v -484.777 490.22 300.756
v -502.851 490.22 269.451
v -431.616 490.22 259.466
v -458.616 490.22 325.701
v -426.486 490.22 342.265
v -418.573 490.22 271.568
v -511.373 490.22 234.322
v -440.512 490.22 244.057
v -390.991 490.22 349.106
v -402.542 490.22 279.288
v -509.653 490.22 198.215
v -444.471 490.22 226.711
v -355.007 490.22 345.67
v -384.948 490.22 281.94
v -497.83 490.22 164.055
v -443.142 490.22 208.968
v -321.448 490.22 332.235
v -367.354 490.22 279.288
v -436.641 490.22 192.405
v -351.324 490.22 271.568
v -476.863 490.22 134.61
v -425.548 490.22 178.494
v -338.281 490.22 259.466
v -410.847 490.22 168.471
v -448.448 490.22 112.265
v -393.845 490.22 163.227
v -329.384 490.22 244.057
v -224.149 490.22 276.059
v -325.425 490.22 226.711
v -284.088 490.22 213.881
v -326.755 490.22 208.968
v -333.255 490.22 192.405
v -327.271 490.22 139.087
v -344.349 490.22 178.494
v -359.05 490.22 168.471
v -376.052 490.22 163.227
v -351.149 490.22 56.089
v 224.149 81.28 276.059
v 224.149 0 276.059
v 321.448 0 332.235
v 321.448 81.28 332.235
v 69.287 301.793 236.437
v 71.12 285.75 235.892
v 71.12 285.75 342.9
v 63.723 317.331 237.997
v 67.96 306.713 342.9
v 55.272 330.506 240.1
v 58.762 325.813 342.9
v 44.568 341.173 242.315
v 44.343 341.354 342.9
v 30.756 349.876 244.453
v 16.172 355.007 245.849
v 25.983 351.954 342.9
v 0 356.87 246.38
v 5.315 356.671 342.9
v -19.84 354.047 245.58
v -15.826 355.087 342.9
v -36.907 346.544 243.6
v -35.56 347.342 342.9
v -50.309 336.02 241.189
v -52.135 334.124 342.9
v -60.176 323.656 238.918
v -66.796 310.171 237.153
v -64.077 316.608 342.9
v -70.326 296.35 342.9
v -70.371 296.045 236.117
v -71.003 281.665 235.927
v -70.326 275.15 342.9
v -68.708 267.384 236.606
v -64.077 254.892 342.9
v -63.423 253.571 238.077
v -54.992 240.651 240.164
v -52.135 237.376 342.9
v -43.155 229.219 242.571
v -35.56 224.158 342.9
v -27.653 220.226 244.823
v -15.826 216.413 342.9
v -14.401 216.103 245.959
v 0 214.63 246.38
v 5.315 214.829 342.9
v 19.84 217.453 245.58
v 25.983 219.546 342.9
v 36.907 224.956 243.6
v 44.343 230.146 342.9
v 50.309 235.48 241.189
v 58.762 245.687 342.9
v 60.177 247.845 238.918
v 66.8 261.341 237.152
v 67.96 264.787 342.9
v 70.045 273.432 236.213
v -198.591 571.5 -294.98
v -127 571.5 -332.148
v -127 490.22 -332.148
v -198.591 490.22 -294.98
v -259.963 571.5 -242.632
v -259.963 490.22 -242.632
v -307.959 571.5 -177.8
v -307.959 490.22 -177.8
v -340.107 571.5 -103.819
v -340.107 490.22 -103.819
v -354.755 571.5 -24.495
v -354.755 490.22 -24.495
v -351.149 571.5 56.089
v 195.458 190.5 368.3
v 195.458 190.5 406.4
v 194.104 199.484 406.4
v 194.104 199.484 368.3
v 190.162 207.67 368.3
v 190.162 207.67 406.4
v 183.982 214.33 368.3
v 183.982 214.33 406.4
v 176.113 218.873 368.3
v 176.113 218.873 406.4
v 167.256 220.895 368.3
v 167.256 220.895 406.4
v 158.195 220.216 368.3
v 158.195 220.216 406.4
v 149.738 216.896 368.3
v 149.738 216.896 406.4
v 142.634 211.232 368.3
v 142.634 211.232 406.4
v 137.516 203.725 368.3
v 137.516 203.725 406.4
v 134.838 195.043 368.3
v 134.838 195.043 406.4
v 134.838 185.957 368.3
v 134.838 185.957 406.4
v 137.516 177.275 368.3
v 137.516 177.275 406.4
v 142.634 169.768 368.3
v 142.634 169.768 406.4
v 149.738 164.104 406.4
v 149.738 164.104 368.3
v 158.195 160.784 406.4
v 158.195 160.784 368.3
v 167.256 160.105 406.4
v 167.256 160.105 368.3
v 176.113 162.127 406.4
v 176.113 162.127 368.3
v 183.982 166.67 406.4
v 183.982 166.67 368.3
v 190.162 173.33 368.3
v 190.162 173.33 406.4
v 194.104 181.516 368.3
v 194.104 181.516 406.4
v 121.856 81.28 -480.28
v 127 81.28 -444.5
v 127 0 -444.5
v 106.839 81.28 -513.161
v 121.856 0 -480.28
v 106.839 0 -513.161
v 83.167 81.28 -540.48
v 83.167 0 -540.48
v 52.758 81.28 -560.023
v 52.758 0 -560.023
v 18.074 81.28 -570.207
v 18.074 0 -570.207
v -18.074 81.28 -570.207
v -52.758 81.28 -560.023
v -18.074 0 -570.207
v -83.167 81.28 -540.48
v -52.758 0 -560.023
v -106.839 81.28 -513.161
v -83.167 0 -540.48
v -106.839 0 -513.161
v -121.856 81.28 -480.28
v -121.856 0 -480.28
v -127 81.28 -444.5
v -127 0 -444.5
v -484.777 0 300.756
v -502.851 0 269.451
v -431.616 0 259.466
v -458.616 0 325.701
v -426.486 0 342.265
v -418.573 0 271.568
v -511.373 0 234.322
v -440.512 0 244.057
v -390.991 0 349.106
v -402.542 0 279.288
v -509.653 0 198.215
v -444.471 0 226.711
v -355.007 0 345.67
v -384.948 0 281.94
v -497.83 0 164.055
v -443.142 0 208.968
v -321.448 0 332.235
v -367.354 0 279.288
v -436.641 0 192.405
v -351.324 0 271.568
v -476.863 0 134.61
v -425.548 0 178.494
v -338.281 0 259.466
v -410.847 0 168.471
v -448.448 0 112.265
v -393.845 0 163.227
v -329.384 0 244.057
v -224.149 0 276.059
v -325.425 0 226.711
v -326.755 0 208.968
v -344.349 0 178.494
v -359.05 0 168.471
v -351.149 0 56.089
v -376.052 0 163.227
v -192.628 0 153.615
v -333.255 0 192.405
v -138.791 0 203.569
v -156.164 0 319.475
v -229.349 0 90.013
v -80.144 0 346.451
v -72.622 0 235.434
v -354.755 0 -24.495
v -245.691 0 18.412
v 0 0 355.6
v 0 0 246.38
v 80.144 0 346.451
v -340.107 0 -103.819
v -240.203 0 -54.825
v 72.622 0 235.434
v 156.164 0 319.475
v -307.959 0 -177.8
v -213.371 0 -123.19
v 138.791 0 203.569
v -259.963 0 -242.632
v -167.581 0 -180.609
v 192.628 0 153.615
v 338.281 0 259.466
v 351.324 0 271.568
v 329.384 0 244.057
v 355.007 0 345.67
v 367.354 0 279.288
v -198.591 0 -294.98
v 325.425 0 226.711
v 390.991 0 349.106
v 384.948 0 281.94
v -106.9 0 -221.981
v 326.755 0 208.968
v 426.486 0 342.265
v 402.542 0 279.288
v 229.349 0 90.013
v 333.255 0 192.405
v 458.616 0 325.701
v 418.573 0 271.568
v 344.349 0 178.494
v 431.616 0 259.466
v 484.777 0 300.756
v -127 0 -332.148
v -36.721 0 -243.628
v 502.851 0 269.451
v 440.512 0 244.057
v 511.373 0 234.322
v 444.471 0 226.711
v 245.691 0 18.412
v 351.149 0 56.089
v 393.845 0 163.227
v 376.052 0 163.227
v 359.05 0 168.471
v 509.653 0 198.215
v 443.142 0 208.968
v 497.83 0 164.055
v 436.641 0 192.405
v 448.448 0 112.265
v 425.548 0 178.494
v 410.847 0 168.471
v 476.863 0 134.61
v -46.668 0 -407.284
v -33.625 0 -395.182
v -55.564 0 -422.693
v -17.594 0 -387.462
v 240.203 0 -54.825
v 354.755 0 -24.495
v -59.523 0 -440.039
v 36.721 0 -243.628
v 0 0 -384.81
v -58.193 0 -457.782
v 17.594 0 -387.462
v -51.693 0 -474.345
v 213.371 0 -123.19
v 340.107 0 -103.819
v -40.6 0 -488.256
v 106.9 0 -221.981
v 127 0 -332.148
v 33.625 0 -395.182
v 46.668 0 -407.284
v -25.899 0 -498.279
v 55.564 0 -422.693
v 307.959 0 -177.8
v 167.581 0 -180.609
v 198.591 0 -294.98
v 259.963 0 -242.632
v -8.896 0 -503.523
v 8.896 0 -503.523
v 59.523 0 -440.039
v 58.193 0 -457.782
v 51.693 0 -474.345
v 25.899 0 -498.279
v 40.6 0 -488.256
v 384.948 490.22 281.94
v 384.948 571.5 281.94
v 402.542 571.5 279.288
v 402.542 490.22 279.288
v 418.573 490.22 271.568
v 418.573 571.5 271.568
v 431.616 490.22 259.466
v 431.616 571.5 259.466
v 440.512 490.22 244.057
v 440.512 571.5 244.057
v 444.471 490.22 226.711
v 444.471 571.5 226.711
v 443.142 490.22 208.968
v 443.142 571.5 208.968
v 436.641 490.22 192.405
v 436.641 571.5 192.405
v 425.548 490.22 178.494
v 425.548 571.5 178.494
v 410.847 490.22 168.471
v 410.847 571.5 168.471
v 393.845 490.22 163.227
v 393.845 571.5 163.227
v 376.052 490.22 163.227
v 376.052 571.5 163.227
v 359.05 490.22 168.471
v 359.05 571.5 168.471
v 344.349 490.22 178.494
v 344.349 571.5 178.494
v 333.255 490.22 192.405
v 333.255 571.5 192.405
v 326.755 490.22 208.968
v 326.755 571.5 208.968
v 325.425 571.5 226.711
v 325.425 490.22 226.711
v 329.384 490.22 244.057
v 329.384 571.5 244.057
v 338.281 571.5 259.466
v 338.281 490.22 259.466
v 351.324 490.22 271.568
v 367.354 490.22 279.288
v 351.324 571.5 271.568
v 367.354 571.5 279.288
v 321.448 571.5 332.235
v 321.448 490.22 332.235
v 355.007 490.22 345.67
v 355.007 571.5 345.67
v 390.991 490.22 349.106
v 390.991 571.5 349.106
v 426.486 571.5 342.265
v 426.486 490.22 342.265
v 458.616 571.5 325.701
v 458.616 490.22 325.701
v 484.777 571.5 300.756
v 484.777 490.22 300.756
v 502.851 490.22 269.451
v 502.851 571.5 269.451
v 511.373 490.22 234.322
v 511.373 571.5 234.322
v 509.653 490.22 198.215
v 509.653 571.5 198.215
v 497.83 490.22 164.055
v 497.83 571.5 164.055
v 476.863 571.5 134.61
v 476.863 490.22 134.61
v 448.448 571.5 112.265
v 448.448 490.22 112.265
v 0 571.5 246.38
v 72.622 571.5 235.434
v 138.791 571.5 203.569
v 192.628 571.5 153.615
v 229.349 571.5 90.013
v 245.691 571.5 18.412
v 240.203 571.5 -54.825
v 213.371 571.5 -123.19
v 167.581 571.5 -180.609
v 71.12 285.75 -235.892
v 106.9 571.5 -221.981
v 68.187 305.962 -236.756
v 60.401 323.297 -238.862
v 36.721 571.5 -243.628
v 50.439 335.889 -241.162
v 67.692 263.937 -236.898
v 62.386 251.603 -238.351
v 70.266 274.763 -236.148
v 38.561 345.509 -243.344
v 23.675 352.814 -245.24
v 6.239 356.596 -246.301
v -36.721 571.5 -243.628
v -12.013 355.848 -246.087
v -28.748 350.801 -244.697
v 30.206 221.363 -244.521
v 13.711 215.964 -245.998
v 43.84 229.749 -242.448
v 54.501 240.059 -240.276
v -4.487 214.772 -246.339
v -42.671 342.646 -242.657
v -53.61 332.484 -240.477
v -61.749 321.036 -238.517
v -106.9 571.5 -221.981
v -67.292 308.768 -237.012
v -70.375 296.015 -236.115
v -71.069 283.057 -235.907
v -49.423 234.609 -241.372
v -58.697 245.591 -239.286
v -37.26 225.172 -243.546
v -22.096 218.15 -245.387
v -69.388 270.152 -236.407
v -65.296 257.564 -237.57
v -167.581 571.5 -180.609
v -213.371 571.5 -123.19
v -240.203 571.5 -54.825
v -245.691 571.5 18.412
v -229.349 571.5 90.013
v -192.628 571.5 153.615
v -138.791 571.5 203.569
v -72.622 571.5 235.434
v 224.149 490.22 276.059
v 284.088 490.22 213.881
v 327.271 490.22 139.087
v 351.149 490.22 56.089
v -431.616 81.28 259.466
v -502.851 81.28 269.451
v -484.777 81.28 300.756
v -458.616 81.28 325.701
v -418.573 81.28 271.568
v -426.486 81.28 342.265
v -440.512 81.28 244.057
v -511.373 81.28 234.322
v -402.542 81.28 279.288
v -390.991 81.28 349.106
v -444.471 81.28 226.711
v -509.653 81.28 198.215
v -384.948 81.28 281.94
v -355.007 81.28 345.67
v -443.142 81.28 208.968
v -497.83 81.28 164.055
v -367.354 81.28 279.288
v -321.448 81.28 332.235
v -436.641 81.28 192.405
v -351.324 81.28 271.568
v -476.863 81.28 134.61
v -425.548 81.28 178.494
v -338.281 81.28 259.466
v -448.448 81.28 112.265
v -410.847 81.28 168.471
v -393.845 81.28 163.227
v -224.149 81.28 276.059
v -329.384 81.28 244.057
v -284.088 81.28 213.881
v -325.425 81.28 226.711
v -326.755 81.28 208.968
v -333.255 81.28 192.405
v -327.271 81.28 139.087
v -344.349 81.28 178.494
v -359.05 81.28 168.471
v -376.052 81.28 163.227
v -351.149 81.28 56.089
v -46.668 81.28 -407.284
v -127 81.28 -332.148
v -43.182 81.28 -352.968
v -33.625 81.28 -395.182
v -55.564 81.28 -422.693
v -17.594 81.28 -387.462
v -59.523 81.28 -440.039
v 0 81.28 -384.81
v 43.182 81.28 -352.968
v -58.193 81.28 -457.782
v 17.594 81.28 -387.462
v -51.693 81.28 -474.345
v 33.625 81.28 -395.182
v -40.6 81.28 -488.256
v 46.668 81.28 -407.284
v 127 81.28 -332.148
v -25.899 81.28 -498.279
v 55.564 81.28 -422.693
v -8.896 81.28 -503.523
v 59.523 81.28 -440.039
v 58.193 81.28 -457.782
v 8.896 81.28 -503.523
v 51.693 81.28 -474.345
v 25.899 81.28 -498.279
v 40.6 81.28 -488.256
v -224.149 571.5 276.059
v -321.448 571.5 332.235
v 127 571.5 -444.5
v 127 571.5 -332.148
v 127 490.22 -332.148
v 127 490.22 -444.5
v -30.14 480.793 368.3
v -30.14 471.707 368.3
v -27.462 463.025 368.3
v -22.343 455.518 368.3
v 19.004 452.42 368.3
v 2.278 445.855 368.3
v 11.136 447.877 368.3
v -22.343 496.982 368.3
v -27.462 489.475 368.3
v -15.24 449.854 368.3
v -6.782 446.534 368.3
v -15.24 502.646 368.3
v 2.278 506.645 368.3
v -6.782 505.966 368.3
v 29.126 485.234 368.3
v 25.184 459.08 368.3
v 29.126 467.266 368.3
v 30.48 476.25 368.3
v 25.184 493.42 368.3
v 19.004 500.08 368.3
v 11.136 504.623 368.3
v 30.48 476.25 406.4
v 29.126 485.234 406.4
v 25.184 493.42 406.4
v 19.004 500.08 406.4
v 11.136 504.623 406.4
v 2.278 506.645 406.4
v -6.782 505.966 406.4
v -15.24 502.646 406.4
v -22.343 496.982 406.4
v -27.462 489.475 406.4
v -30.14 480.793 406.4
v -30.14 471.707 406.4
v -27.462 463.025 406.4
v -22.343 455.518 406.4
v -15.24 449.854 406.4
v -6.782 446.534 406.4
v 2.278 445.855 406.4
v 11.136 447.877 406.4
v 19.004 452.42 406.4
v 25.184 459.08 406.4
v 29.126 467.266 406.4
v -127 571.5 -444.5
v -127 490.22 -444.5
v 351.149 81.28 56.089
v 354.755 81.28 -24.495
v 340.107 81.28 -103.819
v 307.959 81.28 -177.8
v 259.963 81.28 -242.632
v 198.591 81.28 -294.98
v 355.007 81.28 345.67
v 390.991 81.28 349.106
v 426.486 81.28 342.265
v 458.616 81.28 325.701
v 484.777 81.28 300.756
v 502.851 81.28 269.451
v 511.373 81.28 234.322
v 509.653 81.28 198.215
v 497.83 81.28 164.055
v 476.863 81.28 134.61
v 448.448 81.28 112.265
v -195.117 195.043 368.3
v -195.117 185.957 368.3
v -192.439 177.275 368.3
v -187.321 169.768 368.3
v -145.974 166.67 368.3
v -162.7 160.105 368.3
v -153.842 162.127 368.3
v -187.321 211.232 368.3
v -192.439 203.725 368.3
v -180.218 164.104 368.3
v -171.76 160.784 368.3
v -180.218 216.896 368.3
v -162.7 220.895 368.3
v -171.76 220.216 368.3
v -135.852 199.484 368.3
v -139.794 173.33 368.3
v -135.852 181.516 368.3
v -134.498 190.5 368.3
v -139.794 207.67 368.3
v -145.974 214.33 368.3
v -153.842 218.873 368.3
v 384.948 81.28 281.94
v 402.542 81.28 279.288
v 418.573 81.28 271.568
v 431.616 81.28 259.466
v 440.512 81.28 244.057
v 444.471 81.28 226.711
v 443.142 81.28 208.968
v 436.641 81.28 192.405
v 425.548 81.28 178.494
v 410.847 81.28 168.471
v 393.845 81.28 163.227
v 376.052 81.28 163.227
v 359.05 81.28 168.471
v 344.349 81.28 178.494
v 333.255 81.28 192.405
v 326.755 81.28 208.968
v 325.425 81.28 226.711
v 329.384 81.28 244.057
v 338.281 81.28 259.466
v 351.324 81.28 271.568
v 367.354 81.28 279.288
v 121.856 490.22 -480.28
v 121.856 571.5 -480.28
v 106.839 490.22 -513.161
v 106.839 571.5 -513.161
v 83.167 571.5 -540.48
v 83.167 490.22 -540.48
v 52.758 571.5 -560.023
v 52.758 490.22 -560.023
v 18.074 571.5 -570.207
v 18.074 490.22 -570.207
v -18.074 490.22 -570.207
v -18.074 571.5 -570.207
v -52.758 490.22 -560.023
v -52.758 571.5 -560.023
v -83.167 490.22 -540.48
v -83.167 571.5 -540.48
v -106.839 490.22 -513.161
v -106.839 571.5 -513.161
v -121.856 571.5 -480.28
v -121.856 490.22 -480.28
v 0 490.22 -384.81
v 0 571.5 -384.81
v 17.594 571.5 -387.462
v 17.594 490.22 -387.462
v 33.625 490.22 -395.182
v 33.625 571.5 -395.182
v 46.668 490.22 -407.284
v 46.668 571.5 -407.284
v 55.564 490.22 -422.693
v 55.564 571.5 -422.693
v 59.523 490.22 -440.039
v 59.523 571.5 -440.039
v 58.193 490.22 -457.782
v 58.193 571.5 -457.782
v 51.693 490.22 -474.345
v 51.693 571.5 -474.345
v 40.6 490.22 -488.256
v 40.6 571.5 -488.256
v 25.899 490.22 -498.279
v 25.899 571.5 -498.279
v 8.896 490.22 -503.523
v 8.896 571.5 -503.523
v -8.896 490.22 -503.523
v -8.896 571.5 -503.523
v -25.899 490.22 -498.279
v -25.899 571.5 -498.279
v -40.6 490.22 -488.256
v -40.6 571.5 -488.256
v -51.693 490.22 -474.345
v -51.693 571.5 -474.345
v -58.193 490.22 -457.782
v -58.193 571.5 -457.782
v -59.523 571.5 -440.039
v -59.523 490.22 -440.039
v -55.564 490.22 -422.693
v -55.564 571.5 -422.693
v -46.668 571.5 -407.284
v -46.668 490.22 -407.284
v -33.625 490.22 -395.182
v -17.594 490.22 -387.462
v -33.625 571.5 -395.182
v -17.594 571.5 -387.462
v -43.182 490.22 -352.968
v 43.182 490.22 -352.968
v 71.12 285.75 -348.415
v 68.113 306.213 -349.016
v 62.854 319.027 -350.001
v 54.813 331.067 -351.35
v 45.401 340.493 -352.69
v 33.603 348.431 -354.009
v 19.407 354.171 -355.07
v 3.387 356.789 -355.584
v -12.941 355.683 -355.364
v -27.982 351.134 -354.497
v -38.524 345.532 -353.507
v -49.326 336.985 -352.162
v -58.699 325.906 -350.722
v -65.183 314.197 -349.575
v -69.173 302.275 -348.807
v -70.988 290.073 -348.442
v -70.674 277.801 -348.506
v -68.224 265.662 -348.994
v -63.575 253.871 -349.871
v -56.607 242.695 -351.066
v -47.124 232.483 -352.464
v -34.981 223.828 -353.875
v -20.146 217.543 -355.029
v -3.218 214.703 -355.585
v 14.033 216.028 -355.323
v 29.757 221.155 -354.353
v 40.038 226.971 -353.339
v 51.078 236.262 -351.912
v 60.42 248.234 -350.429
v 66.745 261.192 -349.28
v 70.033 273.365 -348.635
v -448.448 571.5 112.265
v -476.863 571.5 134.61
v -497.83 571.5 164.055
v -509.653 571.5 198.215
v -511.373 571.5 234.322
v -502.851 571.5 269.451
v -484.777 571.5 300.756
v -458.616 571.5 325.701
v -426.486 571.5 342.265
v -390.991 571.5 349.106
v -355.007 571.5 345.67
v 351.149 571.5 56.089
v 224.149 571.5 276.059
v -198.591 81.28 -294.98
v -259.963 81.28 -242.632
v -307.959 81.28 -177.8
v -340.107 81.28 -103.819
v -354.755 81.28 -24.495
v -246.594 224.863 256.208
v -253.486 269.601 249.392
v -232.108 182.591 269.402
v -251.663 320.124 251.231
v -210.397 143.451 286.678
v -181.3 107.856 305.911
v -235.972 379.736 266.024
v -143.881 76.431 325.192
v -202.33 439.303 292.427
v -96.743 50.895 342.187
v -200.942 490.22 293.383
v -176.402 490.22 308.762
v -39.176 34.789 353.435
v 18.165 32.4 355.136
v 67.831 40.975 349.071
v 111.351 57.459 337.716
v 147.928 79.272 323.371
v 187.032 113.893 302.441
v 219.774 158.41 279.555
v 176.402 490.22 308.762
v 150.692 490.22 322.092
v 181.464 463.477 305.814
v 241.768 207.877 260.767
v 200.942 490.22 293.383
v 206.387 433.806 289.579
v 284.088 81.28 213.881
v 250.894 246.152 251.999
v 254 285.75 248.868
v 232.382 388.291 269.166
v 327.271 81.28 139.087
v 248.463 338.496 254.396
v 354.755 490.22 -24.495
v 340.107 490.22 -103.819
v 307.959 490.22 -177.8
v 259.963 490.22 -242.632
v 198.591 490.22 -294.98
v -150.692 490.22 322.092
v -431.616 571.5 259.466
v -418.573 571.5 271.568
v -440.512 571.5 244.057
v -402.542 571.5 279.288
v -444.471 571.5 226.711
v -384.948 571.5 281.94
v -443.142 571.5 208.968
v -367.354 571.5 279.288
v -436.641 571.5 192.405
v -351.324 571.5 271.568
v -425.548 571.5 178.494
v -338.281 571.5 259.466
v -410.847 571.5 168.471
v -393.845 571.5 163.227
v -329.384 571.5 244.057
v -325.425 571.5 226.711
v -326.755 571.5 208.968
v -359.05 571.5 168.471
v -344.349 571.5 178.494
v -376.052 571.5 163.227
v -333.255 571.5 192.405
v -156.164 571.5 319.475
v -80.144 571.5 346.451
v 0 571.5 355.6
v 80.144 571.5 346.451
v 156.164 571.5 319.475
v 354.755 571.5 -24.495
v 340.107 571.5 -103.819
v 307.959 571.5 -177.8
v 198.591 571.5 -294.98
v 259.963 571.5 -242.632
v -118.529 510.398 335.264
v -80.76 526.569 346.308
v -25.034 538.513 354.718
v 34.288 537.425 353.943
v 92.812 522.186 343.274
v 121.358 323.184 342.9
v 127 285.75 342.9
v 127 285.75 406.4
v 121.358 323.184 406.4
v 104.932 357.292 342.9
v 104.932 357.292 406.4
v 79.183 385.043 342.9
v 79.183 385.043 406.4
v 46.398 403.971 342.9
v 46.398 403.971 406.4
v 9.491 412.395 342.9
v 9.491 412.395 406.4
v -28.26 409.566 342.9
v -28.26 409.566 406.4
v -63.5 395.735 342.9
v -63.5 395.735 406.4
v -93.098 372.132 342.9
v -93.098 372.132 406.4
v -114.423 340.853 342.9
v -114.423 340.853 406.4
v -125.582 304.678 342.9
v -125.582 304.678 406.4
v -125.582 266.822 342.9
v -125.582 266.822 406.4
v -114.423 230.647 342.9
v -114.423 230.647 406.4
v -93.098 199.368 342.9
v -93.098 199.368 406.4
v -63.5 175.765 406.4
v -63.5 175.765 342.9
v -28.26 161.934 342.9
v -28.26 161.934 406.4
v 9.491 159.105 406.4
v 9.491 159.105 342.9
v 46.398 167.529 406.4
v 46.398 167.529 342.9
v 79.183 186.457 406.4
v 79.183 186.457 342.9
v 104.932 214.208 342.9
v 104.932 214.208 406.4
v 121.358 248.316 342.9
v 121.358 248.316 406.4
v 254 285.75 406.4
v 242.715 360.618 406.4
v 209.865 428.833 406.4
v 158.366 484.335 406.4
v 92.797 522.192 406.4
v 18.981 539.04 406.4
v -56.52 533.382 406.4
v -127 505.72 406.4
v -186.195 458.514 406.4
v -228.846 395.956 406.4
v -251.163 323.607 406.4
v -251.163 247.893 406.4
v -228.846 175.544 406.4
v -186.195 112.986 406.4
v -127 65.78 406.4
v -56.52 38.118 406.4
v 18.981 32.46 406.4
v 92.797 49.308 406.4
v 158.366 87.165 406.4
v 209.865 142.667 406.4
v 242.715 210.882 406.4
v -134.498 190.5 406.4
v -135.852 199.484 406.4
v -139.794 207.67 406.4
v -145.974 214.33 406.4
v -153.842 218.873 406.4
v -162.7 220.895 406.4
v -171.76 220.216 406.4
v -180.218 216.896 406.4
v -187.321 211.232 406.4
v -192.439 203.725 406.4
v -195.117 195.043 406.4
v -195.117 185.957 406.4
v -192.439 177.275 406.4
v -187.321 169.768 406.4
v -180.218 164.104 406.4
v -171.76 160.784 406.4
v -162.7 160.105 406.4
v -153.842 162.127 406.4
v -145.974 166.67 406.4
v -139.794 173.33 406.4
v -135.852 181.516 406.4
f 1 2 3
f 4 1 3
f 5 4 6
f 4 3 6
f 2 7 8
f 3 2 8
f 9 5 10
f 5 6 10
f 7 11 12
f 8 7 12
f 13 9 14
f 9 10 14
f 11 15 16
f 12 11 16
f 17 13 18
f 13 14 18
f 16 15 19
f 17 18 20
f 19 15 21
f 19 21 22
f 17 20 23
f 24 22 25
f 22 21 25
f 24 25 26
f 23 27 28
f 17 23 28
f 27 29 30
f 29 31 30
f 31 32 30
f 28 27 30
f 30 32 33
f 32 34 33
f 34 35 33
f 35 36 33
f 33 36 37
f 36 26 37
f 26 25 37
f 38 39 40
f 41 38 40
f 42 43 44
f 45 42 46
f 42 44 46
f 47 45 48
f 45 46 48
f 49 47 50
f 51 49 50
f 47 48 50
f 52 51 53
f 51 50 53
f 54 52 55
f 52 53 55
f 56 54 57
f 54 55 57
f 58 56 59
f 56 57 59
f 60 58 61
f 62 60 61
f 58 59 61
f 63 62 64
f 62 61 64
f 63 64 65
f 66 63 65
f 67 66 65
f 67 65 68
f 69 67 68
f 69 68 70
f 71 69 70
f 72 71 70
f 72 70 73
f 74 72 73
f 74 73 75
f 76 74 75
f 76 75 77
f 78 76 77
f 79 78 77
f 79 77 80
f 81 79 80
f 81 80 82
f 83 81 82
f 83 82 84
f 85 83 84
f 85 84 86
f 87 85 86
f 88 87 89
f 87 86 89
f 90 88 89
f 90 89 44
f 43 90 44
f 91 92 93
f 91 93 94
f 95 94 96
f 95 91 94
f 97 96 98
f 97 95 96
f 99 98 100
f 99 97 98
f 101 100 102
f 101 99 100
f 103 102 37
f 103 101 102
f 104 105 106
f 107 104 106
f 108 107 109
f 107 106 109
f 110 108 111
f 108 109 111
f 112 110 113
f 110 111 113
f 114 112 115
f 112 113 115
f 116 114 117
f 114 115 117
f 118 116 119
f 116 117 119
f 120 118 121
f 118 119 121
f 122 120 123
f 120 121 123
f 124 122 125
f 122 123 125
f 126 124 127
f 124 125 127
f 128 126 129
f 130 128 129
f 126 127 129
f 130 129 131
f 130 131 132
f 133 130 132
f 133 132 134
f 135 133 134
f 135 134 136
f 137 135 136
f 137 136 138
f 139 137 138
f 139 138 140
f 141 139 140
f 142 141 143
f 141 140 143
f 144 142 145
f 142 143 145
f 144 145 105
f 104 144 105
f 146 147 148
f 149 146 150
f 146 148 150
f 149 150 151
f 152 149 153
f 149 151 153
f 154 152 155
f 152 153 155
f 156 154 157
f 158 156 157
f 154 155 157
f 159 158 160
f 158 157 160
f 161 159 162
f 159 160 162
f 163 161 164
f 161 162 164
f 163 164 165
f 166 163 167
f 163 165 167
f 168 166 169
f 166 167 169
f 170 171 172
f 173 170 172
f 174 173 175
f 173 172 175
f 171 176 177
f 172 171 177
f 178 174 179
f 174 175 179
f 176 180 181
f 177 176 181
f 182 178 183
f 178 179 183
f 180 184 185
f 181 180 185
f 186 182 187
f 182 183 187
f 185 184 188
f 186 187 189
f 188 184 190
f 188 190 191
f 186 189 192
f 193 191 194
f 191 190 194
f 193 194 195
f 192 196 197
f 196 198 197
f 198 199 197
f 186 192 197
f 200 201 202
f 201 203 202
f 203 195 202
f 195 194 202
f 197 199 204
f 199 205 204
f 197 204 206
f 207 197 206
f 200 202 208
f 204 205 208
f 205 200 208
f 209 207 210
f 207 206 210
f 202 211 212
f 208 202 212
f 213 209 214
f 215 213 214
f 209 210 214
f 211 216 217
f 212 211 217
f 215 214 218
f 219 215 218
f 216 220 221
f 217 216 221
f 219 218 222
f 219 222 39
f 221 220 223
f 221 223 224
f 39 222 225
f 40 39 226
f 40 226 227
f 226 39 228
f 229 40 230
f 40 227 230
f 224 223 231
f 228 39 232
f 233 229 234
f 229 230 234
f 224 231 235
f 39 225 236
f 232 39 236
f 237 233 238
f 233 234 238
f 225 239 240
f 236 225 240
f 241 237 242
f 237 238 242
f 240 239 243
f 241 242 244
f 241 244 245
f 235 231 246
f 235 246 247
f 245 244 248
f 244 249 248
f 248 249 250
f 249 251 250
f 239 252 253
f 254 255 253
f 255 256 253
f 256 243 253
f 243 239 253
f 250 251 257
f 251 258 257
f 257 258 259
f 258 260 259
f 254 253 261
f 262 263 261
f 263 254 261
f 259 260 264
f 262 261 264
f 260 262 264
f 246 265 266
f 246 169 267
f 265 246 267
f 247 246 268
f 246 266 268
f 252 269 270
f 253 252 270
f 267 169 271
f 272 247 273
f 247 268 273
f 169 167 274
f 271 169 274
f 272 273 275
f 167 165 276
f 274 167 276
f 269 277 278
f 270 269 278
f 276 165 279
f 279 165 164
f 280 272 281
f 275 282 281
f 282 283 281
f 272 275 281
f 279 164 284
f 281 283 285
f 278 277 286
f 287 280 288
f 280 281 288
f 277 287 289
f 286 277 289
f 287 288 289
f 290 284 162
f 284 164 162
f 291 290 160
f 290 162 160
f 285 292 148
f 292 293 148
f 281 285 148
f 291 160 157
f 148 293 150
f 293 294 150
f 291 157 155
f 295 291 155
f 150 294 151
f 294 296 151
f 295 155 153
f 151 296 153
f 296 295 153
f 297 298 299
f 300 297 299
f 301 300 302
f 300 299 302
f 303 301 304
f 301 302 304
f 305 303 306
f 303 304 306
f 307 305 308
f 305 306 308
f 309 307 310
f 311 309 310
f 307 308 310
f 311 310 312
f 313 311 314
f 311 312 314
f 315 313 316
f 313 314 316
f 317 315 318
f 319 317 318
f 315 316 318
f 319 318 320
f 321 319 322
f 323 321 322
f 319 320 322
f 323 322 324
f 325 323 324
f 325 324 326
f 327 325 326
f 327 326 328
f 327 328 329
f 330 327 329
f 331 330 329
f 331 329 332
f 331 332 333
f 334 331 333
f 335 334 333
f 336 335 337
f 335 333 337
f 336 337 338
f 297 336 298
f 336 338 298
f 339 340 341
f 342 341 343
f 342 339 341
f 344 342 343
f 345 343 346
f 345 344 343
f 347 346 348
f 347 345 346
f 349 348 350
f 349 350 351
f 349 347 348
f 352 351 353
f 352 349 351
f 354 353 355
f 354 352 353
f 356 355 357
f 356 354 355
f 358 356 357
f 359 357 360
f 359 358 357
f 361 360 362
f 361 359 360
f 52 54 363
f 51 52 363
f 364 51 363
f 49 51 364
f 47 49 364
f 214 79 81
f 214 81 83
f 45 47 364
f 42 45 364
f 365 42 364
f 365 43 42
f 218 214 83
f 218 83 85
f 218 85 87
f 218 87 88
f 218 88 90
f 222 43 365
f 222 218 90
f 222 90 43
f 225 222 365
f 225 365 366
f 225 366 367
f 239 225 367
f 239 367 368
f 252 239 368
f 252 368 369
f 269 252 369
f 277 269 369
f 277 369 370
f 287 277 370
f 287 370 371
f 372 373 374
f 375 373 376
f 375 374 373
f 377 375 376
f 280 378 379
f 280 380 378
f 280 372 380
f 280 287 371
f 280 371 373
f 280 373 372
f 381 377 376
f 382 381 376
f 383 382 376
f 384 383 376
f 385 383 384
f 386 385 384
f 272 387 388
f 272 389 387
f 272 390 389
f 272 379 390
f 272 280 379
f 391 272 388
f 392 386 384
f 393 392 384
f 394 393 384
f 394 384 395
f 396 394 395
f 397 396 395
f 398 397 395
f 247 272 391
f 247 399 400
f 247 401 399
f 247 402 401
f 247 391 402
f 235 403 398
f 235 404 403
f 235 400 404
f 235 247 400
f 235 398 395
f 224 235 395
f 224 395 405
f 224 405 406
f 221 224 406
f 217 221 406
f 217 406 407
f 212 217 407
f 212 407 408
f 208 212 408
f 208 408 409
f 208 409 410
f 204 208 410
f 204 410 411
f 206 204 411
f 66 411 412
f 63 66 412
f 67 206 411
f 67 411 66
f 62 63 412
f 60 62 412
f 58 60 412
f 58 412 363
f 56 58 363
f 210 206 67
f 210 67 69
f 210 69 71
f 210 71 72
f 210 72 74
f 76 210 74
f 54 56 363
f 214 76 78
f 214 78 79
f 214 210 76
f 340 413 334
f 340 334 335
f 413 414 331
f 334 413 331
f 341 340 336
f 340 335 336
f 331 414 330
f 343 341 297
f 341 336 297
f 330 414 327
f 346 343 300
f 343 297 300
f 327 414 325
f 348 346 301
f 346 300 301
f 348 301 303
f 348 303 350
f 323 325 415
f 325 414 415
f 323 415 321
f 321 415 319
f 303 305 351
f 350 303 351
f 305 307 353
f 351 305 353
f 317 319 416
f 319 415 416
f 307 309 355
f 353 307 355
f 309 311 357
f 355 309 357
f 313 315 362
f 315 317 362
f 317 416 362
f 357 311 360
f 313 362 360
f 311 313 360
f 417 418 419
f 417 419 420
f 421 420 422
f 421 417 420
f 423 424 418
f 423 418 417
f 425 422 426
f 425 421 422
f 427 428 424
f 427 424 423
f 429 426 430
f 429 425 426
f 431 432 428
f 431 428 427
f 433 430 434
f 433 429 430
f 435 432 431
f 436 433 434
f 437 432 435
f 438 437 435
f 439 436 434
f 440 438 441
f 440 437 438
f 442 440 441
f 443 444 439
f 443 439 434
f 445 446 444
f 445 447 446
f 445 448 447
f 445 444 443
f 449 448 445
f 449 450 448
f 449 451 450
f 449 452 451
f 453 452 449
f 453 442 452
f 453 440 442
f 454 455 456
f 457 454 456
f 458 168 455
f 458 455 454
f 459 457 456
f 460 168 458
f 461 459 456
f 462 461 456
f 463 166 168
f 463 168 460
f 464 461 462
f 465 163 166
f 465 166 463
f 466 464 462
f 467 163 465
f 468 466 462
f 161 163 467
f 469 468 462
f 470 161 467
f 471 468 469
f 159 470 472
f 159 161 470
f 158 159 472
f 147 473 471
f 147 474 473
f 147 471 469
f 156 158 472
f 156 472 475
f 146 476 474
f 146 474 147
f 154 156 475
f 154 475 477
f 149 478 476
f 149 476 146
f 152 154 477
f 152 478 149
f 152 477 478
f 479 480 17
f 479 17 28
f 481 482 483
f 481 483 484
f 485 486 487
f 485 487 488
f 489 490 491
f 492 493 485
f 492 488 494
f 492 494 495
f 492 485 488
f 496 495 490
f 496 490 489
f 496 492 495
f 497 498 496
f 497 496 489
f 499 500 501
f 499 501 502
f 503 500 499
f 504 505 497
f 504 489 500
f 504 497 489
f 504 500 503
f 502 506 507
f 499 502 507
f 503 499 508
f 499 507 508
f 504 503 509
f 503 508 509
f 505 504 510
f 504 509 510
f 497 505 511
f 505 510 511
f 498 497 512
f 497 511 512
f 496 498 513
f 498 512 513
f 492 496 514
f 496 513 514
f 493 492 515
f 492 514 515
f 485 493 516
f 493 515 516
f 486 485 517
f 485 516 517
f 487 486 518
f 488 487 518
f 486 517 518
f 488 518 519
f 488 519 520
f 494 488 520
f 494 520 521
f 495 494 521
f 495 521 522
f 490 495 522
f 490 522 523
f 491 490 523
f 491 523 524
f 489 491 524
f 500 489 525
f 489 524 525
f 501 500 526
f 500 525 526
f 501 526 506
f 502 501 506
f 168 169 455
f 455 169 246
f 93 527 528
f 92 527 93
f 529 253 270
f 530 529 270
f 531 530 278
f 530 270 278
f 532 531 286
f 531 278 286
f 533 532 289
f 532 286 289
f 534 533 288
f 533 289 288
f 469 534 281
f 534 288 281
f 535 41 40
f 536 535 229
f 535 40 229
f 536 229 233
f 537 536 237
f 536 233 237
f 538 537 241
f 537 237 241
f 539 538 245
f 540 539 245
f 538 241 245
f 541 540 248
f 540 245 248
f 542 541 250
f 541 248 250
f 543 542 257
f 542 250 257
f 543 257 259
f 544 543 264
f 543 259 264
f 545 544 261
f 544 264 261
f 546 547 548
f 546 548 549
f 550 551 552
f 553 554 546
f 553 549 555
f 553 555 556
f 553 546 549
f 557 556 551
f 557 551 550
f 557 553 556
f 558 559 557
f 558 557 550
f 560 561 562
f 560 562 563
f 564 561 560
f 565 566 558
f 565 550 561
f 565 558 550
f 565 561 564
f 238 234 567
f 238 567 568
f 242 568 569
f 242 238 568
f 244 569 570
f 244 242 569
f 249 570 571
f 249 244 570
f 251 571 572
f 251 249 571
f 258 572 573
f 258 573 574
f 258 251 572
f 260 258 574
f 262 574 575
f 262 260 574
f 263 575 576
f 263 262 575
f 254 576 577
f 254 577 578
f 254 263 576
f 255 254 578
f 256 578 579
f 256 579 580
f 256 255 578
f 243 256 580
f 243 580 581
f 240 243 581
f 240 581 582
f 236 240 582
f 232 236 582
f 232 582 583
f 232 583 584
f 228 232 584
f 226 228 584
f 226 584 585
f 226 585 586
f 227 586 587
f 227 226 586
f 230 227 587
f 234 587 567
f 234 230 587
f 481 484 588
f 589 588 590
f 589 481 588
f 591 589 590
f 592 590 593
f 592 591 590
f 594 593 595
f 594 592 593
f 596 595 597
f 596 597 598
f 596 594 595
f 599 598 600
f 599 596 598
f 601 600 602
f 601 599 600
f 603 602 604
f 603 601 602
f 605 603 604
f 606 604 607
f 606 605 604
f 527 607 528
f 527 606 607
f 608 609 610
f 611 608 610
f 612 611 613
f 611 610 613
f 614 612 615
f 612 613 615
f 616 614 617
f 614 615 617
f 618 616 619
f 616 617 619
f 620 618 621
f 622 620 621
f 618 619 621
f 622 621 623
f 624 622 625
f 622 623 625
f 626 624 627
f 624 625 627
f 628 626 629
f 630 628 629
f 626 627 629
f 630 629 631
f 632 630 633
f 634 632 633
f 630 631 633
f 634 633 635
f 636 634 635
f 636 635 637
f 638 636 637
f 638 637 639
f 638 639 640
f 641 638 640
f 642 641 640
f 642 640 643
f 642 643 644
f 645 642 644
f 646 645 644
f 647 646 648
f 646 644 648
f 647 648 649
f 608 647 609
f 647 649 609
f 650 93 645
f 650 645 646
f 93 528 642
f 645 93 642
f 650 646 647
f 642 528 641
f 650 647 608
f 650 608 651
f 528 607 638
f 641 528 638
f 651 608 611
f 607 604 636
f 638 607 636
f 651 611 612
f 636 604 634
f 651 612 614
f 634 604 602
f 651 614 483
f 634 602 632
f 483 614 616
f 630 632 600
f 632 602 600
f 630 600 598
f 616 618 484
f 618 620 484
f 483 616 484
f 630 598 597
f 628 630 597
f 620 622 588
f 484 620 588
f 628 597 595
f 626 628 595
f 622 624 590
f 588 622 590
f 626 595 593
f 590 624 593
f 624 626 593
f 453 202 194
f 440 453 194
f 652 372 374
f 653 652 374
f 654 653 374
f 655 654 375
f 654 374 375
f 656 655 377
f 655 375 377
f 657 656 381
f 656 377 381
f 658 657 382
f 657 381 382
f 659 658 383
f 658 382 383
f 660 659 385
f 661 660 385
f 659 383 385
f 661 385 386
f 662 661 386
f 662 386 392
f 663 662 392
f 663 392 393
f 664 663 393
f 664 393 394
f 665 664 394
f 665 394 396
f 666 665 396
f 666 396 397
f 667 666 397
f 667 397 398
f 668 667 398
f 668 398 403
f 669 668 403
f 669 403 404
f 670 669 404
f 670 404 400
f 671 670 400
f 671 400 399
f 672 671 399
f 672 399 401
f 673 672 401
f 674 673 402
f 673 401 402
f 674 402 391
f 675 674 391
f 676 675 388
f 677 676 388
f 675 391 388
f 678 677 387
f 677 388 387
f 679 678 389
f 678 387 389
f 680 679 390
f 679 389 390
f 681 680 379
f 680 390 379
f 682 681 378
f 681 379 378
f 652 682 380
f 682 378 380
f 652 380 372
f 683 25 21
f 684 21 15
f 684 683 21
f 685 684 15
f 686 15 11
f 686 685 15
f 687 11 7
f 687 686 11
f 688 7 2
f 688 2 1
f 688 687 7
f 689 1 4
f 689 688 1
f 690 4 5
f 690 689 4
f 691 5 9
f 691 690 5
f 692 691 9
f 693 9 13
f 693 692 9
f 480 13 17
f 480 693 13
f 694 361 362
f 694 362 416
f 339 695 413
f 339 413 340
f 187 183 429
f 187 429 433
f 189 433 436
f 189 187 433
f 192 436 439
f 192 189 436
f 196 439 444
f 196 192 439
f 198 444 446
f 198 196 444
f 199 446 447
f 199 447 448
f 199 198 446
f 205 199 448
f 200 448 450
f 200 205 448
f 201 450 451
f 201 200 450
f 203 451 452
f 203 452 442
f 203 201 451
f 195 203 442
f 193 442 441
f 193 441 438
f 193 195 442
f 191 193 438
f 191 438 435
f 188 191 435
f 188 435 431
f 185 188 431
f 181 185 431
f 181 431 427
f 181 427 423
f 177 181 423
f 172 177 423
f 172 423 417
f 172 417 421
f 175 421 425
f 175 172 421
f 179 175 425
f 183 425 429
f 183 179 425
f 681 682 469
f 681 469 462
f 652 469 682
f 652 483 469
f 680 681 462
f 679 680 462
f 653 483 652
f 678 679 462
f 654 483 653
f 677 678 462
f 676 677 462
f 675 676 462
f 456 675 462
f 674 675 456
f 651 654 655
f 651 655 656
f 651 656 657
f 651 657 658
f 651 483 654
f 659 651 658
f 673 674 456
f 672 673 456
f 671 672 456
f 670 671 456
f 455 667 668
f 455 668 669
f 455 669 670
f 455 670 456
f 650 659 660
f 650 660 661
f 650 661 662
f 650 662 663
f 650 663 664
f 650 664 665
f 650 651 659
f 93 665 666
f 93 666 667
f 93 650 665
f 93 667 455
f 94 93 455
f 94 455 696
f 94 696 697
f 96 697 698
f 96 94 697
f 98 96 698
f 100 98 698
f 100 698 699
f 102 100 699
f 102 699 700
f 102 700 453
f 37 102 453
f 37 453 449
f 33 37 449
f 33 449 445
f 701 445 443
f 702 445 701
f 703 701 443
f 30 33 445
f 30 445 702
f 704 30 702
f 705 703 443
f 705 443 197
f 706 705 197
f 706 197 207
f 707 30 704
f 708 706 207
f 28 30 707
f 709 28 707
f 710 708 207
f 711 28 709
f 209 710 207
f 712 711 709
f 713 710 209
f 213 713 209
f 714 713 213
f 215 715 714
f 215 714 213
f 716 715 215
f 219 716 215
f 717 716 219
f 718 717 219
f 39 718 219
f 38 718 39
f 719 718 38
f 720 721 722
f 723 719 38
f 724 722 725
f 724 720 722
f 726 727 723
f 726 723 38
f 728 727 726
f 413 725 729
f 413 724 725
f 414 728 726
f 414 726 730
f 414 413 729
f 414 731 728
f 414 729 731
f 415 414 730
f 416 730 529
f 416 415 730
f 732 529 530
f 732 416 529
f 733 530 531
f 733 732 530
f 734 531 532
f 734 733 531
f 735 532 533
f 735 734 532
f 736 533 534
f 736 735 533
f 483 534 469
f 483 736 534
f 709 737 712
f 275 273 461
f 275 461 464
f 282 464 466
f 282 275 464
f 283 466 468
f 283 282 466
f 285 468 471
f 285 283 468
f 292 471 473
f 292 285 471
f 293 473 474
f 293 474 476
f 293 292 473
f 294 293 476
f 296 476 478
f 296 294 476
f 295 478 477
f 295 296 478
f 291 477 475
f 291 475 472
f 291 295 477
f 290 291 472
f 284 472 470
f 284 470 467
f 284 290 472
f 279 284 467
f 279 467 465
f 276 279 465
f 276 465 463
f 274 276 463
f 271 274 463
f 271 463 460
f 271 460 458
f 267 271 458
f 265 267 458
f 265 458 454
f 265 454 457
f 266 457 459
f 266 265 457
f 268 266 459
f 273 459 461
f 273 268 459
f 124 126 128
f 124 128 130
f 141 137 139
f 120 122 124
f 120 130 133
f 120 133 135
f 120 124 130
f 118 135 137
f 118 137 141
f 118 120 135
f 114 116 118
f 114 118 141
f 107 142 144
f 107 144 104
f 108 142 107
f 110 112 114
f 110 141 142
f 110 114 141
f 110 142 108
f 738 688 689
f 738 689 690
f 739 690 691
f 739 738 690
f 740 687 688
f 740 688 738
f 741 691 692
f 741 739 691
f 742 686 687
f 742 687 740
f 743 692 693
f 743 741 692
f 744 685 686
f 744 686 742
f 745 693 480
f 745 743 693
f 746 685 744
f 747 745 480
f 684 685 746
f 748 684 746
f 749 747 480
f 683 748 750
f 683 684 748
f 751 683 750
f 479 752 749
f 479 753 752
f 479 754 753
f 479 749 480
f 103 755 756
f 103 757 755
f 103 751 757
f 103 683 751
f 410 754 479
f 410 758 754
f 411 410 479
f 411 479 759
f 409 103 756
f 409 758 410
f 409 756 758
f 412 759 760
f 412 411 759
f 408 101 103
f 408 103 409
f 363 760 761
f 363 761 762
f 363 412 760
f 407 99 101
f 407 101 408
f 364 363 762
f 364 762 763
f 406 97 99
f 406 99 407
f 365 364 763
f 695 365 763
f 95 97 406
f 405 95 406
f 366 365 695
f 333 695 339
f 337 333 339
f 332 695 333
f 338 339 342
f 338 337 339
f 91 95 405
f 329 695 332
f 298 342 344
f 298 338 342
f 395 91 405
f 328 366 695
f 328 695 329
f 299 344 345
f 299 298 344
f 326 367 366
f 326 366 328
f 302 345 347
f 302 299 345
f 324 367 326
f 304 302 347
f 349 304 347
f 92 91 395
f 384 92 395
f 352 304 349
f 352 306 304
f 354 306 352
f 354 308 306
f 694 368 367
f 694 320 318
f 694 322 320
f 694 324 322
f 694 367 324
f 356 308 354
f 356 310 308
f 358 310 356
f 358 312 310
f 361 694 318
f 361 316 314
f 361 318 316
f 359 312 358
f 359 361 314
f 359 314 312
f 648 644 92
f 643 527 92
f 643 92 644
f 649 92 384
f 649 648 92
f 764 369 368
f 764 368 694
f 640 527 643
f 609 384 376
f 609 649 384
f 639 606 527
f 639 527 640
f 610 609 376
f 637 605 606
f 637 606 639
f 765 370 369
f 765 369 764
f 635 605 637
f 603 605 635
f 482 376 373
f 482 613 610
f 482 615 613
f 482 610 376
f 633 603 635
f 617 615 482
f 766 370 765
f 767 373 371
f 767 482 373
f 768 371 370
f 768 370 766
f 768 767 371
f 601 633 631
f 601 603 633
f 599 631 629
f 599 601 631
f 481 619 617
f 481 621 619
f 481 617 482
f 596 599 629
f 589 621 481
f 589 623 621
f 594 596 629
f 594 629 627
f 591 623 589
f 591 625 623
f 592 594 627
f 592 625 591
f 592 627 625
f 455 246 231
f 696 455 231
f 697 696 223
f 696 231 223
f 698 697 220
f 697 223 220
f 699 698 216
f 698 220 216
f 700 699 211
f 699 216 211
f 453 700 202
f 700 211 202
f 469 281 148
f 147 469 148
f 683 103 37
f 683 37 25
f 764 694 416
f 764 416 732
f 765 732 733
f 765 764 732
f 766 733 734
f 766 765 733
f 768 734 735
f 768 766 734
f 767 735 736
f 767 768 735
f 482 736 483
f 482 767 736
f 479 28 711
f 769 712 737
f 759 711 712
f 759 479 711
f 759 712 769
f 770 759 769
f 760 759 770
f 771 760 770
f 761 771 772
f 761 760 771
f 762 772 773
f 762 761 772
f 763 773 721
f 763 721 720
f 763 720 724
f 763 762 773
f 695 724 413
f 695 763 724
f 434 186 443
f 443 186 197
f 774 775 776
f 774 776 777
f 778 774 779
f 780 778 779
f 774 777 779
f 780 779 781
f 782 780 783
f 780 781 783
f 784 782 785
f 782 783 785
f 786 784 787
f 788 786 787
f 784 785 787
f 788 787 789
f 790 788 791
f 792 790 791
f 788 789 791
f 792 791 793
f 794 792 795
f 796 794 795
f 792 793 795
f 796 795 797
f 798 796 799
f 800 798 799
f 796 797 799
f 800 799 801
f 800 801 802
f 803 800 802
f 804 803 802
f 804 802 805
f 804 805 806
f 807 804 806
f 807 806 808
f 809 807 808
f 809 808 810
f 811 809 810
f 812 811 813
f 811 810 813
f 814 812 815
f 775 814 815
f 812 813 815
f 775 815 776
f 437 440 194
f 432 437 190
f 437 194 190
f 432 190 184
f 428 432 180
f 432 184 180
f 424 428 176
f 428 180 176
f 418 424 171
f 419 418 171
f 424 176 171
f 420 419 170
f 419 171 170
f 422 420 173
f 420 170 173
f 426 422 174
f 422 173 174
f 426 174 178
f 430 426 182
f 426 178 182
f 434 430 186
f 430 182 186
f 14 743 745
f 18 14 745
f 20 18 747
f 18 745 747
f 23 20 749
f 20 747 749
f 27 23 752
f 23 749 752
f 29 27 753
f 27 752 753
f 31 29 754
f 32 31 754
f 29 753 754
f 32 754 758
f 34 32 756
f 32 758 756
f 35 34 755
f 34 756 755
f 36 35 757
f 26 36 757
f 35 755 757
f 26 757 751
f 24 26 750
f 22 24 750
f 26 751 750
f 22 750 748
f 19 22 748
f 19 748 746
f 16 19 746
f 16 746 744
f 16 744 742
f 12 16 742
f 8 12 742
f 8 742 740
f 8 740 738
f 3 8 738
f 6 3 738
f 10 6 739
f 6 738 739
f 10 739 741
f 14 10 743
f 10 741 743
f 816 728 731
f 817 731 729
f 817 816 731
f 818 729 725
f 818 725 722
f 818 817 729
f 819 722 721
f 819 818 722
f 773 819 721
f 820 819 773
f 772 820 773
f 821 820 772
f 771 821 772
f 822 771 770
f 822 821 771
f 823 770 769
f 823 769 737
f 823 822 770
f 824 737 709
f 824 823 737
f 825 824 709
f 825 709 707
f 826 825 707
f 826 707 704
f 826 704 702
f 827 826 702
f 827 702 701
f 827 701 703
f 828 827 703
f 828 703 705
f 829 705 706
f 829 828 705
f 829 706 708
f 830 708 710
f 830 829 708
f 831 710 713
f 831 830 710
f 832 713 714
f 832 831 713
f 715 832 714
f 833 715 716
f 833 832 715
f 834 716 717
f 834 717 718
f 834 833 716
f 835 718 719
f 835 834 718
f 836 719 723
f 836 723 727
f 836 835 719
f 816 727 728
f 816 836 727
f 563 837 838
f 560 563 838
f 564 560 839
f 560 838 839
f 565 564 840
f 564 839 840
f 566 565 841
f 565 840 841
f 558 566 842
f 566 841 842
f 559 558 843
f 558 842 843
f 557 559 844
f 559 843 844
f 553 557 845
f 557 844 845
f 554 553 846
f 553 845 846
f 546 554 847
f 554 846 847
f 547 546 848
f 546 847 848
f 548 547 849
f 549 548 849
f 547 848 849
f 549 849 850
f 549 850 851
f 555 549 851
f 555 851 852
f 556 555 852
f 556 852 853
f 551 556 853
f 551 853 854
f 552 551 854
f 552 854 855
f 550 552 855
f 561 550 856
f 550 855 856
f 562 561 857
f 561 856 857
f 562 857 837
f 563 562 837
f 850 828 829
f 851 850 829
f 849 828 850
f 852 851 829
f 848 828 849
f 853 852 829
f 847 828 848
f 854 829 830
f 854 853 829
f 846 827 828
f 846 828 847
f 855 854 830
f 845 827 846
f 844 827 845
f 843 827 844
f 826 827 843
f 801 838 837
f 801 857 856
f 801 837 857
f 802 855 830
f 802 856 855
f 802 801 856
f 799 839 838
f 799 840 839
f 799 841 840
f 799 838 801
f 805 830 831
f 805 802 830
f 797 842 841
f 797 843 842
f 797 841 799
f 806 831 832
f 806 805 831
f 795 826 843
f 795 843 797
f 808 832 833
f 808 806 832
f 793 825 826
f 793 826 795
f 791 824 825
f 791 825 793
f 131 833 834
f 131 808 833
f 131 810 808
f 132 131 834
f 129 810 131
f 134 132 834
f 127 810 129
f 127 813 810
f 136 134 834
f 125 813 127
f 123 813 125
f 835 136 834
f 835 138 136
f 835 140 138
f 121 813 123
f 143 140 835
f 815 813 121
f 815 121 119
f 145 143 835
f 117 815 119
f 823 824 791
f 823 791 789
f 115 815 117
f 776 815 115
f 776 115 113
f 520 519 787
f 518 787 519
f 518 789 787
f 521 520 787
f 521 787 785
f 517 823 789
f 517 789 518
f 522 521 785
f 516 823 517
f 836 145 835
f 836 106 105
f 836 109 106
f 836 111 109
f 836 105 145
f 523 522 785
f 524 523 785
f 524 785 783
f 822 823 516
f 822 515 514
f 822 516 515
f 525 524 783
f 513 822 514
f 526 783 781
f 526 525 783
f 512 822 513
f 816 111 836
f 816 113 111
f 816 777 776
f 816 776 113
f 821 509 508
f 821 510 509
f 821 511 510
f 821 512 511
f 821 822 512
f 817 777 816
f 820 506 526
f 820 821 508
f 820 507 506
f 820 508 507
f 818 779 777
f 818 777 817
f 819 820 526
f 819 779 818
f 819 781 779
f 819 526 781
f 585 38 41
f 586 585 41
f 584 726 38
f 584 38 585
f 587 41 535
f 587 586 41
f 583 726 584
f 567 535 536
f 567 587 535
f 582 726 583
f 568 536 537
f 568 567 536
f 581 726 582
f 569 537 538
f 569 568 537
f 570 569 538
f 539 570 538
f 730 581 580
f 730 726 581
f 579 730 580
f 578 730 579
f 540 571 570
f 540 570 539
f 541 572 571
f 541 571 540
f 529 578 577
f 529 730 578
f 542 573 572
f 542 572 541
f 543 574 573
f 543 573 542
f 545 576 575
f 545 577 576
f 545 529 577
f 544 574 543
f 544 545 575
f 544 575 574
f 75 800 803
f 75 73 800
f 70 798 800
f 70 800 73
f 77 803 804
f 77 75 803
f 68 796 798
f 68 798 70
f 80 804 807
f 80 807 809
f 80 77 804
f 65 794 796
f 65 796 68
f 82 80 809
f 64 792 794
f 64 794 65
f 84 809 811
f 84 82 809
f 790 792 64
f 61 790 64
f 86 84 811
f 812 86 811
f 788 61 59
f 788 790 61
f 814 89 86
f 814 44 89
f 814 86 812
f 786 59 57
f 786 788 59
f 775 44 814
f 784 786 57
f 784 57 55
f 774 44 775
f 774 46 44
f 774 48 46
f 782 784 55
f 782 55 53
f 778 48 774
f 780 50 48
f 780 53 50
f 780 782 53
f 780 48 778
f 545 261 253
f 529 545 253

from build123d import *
from build123d.topology import SkipClean

# Parameters (mm, degrees)
SKETCH1_R                       = 246.38
SKETCH1_R_2                     = 59.69
BOSS_EXTRUDE1_DEPTH             = 81.28
SKETCH2_R                       = 355.6
SKETCH2_R_2                     = 246.38
BOSS_EXTRUDE2_DEPTH             = 204.47
BOSS_EXTRUDE3_START             = 381
SKETCH3_R                       = 254
BOSS_EXTRUDE3_DEPTH             = 25.4
BOSS_EXTRUDE3_DIRECTION_2_REACH = 1339.721
SKETCH4_R                       = 30.48
CUT_EXTRUDE1_DEPTH              = 38.1
SKETCH4_4_R                     = 127
CUT_EXTRUDE2_DEPTH              = 63.5
SKETCH5_R                       = 71.12
CUT_EXTRUDE3_DEPTH              = 762


with BuildPart() as part:
    # Sketch1 → Boss-Extrude1 (new body)
    with BuildSketch(Plane(origin=(0, 0, 0), x_dir=(1, 0, 0), z_dir=(0, 1, 0))):
        with BuildLine():
            Line((-127, 444.5), (-127, 332.148099))
            ThreePointArc((-127, 332.148099), (-307.958634, 177.8), (-351.148692, -56.088823))
            Line((-351.148692, -56.088823), (-448.448292, -112.264774))
            ThreePointArc((-448.448292, -112.264774), (-494.933518, -285.75), (-321.448292, -332.235226))
            Line((-321.448292, -332.235226), (-224.148692, -276.059276))
            ThreePointArc((-224.148692, -276.059276), (0, -355.6), (224.148692, -276.059276))
            Line((224.148692, -276.059276), (321.448292, -332.235226))
            ThreePointArc((321.448292, -332.235226), (494.933518, -285.75), (448.448292, -112.264774))
            Line((448.448292, -112.264774), (351.148692, -56.088823))
            ThreePointArc((351.148692, -56.088823), (307.958634, 177.8), (127, 332.148099))
            Line((127, 332.148099), (127, 444.5))
            ThreePointArc((127, 444.5), (0, 571.5), (-127, 444.5))
        make_face()
        with Locations(Location((0, 0, 0), (0, 0, 270))):
            Circle(SKETCH1_R, mode=Mode.SUBTRACT)
        with Locations(Location((0, 444.5, 0), (0, 0, 270))):
            Circle(SKETCH1_R_2, mode=Mode.SUBTRACT)
        with Locations(Location((384.948292, -222.25, 0), (0, 0, 270))):
            Circle(SKETCH1_R_2, mode=Mode.SUBTRACT)
        with Locations(Location((-384.948292, -222.25, 0), (0, 0, 270))):
            Circle(SKETCH1_R_2, mode=Mode.SUBTRACT)
    extrude(amount=BOSS_EXTRUDE1_DEPTH)

    # Sketch2 → Boss-Extrude2 (add)
    with BuildSketch(Plane(origin=(0, 81.28, 0), x_dir=(1, 0, 0), z_dir=(0, 1, 0))):
        with Locations(Location((0, 0, 0), (0, 0, 69.075168))):
            Circle(SKETCH2_R)
        with Locations(Location((0, 0, 0), (0, 0, 270))):
            Circle(SKETCH2_R_2, mode=Mode.SUBTRACT)
    extrude(amount=BOSS_EXTRUDE2_DEPTH)

    # Mirror2: part across plane


with BuildPart() as part_1:
    add(part.part)
    add(part.part.mirror(Plane.ZX.offset(285.75)))

    # Sketch3 → Boss-Extrude3 (add)
    with BuildSketch(Plane.XY.offset(BOSS_EXTRUDE3_START)):
        with Locations((0, 285.75)):
            Circle(SKETCH3_R)
    extrude(amount=BOSS_EXTRUDE3_DEPTH)

    # Sketch3 → Boss-Extrude3 direction 2 (add, up to next)
    with BuildSketch(Plane.XY.offset(BOSS_EXTRUDE3_START), mode=Mode.PRIVATE) as boss_extrude3_direction_2_sk1:
        with Locations((0, 285.75)):
            Circle(SKETCH3_R)
    boss_extrude3_direction_2_tool1 = extrude(boss_extrude3_direction_2_sk1.sketch, amount=-BOSS_EXTRUDE3_DIRECTION_2_REACH, mode=Mode.PRIVATE) - part_1.part
    add(boss_extrude3_direction_2_tool1.solids().sort_by_distance((0, 285.75, 381))[0])

    # Sketch4 → Cut-Extrude1 (cut)
    with SkipClean():  # the faces are left unmerged after this step: merging them gives an invalid solid
        with BuildSketch(Plane.XY.offset(406.4)):
            with Locations((0, 476.25)):
                Circle(SKETCH4_R)
            with Locations((164.977839, 190.5)):
                Circle(SKETCH4_R)
            with Locations((-164.977839, 190.5)):
                Circle(SKETCH4_R)
        extrude(amount=-CUT_EXTRUDE1_DEPTH, mode=Mode.SUBTRACT)

    # Sketch4_4 → Cut-Extrude2 (cut)
    with SkipClean():  # the faces are left unmerged after this step: merging them gives an invalid solid
        with BuildSketch(Plane.XY.offset(406.4)):
            with Locations((0, 285.75)):
                Circle(SKETCH4_4_R)
        extrude(amount=-CUT_EXTRUDE2_DEPTH, mode=Mode.SUBTRACT)

    # Sketch5 → Cut-Extrude3 (cut)
    with SkipClean():  # the faces are left unmerged after this step: merging them gives an invalid solid
        with BuildSketch(Plane.XY.offset(342.9)):
            with Locations((0, 285.75)):
                Circle(SKETCH5_R)
        extrude(amount=-CUT_EXTRUDE3_DEPTH, mode=Mode.SUBTRACT)


solid = part_1.part
